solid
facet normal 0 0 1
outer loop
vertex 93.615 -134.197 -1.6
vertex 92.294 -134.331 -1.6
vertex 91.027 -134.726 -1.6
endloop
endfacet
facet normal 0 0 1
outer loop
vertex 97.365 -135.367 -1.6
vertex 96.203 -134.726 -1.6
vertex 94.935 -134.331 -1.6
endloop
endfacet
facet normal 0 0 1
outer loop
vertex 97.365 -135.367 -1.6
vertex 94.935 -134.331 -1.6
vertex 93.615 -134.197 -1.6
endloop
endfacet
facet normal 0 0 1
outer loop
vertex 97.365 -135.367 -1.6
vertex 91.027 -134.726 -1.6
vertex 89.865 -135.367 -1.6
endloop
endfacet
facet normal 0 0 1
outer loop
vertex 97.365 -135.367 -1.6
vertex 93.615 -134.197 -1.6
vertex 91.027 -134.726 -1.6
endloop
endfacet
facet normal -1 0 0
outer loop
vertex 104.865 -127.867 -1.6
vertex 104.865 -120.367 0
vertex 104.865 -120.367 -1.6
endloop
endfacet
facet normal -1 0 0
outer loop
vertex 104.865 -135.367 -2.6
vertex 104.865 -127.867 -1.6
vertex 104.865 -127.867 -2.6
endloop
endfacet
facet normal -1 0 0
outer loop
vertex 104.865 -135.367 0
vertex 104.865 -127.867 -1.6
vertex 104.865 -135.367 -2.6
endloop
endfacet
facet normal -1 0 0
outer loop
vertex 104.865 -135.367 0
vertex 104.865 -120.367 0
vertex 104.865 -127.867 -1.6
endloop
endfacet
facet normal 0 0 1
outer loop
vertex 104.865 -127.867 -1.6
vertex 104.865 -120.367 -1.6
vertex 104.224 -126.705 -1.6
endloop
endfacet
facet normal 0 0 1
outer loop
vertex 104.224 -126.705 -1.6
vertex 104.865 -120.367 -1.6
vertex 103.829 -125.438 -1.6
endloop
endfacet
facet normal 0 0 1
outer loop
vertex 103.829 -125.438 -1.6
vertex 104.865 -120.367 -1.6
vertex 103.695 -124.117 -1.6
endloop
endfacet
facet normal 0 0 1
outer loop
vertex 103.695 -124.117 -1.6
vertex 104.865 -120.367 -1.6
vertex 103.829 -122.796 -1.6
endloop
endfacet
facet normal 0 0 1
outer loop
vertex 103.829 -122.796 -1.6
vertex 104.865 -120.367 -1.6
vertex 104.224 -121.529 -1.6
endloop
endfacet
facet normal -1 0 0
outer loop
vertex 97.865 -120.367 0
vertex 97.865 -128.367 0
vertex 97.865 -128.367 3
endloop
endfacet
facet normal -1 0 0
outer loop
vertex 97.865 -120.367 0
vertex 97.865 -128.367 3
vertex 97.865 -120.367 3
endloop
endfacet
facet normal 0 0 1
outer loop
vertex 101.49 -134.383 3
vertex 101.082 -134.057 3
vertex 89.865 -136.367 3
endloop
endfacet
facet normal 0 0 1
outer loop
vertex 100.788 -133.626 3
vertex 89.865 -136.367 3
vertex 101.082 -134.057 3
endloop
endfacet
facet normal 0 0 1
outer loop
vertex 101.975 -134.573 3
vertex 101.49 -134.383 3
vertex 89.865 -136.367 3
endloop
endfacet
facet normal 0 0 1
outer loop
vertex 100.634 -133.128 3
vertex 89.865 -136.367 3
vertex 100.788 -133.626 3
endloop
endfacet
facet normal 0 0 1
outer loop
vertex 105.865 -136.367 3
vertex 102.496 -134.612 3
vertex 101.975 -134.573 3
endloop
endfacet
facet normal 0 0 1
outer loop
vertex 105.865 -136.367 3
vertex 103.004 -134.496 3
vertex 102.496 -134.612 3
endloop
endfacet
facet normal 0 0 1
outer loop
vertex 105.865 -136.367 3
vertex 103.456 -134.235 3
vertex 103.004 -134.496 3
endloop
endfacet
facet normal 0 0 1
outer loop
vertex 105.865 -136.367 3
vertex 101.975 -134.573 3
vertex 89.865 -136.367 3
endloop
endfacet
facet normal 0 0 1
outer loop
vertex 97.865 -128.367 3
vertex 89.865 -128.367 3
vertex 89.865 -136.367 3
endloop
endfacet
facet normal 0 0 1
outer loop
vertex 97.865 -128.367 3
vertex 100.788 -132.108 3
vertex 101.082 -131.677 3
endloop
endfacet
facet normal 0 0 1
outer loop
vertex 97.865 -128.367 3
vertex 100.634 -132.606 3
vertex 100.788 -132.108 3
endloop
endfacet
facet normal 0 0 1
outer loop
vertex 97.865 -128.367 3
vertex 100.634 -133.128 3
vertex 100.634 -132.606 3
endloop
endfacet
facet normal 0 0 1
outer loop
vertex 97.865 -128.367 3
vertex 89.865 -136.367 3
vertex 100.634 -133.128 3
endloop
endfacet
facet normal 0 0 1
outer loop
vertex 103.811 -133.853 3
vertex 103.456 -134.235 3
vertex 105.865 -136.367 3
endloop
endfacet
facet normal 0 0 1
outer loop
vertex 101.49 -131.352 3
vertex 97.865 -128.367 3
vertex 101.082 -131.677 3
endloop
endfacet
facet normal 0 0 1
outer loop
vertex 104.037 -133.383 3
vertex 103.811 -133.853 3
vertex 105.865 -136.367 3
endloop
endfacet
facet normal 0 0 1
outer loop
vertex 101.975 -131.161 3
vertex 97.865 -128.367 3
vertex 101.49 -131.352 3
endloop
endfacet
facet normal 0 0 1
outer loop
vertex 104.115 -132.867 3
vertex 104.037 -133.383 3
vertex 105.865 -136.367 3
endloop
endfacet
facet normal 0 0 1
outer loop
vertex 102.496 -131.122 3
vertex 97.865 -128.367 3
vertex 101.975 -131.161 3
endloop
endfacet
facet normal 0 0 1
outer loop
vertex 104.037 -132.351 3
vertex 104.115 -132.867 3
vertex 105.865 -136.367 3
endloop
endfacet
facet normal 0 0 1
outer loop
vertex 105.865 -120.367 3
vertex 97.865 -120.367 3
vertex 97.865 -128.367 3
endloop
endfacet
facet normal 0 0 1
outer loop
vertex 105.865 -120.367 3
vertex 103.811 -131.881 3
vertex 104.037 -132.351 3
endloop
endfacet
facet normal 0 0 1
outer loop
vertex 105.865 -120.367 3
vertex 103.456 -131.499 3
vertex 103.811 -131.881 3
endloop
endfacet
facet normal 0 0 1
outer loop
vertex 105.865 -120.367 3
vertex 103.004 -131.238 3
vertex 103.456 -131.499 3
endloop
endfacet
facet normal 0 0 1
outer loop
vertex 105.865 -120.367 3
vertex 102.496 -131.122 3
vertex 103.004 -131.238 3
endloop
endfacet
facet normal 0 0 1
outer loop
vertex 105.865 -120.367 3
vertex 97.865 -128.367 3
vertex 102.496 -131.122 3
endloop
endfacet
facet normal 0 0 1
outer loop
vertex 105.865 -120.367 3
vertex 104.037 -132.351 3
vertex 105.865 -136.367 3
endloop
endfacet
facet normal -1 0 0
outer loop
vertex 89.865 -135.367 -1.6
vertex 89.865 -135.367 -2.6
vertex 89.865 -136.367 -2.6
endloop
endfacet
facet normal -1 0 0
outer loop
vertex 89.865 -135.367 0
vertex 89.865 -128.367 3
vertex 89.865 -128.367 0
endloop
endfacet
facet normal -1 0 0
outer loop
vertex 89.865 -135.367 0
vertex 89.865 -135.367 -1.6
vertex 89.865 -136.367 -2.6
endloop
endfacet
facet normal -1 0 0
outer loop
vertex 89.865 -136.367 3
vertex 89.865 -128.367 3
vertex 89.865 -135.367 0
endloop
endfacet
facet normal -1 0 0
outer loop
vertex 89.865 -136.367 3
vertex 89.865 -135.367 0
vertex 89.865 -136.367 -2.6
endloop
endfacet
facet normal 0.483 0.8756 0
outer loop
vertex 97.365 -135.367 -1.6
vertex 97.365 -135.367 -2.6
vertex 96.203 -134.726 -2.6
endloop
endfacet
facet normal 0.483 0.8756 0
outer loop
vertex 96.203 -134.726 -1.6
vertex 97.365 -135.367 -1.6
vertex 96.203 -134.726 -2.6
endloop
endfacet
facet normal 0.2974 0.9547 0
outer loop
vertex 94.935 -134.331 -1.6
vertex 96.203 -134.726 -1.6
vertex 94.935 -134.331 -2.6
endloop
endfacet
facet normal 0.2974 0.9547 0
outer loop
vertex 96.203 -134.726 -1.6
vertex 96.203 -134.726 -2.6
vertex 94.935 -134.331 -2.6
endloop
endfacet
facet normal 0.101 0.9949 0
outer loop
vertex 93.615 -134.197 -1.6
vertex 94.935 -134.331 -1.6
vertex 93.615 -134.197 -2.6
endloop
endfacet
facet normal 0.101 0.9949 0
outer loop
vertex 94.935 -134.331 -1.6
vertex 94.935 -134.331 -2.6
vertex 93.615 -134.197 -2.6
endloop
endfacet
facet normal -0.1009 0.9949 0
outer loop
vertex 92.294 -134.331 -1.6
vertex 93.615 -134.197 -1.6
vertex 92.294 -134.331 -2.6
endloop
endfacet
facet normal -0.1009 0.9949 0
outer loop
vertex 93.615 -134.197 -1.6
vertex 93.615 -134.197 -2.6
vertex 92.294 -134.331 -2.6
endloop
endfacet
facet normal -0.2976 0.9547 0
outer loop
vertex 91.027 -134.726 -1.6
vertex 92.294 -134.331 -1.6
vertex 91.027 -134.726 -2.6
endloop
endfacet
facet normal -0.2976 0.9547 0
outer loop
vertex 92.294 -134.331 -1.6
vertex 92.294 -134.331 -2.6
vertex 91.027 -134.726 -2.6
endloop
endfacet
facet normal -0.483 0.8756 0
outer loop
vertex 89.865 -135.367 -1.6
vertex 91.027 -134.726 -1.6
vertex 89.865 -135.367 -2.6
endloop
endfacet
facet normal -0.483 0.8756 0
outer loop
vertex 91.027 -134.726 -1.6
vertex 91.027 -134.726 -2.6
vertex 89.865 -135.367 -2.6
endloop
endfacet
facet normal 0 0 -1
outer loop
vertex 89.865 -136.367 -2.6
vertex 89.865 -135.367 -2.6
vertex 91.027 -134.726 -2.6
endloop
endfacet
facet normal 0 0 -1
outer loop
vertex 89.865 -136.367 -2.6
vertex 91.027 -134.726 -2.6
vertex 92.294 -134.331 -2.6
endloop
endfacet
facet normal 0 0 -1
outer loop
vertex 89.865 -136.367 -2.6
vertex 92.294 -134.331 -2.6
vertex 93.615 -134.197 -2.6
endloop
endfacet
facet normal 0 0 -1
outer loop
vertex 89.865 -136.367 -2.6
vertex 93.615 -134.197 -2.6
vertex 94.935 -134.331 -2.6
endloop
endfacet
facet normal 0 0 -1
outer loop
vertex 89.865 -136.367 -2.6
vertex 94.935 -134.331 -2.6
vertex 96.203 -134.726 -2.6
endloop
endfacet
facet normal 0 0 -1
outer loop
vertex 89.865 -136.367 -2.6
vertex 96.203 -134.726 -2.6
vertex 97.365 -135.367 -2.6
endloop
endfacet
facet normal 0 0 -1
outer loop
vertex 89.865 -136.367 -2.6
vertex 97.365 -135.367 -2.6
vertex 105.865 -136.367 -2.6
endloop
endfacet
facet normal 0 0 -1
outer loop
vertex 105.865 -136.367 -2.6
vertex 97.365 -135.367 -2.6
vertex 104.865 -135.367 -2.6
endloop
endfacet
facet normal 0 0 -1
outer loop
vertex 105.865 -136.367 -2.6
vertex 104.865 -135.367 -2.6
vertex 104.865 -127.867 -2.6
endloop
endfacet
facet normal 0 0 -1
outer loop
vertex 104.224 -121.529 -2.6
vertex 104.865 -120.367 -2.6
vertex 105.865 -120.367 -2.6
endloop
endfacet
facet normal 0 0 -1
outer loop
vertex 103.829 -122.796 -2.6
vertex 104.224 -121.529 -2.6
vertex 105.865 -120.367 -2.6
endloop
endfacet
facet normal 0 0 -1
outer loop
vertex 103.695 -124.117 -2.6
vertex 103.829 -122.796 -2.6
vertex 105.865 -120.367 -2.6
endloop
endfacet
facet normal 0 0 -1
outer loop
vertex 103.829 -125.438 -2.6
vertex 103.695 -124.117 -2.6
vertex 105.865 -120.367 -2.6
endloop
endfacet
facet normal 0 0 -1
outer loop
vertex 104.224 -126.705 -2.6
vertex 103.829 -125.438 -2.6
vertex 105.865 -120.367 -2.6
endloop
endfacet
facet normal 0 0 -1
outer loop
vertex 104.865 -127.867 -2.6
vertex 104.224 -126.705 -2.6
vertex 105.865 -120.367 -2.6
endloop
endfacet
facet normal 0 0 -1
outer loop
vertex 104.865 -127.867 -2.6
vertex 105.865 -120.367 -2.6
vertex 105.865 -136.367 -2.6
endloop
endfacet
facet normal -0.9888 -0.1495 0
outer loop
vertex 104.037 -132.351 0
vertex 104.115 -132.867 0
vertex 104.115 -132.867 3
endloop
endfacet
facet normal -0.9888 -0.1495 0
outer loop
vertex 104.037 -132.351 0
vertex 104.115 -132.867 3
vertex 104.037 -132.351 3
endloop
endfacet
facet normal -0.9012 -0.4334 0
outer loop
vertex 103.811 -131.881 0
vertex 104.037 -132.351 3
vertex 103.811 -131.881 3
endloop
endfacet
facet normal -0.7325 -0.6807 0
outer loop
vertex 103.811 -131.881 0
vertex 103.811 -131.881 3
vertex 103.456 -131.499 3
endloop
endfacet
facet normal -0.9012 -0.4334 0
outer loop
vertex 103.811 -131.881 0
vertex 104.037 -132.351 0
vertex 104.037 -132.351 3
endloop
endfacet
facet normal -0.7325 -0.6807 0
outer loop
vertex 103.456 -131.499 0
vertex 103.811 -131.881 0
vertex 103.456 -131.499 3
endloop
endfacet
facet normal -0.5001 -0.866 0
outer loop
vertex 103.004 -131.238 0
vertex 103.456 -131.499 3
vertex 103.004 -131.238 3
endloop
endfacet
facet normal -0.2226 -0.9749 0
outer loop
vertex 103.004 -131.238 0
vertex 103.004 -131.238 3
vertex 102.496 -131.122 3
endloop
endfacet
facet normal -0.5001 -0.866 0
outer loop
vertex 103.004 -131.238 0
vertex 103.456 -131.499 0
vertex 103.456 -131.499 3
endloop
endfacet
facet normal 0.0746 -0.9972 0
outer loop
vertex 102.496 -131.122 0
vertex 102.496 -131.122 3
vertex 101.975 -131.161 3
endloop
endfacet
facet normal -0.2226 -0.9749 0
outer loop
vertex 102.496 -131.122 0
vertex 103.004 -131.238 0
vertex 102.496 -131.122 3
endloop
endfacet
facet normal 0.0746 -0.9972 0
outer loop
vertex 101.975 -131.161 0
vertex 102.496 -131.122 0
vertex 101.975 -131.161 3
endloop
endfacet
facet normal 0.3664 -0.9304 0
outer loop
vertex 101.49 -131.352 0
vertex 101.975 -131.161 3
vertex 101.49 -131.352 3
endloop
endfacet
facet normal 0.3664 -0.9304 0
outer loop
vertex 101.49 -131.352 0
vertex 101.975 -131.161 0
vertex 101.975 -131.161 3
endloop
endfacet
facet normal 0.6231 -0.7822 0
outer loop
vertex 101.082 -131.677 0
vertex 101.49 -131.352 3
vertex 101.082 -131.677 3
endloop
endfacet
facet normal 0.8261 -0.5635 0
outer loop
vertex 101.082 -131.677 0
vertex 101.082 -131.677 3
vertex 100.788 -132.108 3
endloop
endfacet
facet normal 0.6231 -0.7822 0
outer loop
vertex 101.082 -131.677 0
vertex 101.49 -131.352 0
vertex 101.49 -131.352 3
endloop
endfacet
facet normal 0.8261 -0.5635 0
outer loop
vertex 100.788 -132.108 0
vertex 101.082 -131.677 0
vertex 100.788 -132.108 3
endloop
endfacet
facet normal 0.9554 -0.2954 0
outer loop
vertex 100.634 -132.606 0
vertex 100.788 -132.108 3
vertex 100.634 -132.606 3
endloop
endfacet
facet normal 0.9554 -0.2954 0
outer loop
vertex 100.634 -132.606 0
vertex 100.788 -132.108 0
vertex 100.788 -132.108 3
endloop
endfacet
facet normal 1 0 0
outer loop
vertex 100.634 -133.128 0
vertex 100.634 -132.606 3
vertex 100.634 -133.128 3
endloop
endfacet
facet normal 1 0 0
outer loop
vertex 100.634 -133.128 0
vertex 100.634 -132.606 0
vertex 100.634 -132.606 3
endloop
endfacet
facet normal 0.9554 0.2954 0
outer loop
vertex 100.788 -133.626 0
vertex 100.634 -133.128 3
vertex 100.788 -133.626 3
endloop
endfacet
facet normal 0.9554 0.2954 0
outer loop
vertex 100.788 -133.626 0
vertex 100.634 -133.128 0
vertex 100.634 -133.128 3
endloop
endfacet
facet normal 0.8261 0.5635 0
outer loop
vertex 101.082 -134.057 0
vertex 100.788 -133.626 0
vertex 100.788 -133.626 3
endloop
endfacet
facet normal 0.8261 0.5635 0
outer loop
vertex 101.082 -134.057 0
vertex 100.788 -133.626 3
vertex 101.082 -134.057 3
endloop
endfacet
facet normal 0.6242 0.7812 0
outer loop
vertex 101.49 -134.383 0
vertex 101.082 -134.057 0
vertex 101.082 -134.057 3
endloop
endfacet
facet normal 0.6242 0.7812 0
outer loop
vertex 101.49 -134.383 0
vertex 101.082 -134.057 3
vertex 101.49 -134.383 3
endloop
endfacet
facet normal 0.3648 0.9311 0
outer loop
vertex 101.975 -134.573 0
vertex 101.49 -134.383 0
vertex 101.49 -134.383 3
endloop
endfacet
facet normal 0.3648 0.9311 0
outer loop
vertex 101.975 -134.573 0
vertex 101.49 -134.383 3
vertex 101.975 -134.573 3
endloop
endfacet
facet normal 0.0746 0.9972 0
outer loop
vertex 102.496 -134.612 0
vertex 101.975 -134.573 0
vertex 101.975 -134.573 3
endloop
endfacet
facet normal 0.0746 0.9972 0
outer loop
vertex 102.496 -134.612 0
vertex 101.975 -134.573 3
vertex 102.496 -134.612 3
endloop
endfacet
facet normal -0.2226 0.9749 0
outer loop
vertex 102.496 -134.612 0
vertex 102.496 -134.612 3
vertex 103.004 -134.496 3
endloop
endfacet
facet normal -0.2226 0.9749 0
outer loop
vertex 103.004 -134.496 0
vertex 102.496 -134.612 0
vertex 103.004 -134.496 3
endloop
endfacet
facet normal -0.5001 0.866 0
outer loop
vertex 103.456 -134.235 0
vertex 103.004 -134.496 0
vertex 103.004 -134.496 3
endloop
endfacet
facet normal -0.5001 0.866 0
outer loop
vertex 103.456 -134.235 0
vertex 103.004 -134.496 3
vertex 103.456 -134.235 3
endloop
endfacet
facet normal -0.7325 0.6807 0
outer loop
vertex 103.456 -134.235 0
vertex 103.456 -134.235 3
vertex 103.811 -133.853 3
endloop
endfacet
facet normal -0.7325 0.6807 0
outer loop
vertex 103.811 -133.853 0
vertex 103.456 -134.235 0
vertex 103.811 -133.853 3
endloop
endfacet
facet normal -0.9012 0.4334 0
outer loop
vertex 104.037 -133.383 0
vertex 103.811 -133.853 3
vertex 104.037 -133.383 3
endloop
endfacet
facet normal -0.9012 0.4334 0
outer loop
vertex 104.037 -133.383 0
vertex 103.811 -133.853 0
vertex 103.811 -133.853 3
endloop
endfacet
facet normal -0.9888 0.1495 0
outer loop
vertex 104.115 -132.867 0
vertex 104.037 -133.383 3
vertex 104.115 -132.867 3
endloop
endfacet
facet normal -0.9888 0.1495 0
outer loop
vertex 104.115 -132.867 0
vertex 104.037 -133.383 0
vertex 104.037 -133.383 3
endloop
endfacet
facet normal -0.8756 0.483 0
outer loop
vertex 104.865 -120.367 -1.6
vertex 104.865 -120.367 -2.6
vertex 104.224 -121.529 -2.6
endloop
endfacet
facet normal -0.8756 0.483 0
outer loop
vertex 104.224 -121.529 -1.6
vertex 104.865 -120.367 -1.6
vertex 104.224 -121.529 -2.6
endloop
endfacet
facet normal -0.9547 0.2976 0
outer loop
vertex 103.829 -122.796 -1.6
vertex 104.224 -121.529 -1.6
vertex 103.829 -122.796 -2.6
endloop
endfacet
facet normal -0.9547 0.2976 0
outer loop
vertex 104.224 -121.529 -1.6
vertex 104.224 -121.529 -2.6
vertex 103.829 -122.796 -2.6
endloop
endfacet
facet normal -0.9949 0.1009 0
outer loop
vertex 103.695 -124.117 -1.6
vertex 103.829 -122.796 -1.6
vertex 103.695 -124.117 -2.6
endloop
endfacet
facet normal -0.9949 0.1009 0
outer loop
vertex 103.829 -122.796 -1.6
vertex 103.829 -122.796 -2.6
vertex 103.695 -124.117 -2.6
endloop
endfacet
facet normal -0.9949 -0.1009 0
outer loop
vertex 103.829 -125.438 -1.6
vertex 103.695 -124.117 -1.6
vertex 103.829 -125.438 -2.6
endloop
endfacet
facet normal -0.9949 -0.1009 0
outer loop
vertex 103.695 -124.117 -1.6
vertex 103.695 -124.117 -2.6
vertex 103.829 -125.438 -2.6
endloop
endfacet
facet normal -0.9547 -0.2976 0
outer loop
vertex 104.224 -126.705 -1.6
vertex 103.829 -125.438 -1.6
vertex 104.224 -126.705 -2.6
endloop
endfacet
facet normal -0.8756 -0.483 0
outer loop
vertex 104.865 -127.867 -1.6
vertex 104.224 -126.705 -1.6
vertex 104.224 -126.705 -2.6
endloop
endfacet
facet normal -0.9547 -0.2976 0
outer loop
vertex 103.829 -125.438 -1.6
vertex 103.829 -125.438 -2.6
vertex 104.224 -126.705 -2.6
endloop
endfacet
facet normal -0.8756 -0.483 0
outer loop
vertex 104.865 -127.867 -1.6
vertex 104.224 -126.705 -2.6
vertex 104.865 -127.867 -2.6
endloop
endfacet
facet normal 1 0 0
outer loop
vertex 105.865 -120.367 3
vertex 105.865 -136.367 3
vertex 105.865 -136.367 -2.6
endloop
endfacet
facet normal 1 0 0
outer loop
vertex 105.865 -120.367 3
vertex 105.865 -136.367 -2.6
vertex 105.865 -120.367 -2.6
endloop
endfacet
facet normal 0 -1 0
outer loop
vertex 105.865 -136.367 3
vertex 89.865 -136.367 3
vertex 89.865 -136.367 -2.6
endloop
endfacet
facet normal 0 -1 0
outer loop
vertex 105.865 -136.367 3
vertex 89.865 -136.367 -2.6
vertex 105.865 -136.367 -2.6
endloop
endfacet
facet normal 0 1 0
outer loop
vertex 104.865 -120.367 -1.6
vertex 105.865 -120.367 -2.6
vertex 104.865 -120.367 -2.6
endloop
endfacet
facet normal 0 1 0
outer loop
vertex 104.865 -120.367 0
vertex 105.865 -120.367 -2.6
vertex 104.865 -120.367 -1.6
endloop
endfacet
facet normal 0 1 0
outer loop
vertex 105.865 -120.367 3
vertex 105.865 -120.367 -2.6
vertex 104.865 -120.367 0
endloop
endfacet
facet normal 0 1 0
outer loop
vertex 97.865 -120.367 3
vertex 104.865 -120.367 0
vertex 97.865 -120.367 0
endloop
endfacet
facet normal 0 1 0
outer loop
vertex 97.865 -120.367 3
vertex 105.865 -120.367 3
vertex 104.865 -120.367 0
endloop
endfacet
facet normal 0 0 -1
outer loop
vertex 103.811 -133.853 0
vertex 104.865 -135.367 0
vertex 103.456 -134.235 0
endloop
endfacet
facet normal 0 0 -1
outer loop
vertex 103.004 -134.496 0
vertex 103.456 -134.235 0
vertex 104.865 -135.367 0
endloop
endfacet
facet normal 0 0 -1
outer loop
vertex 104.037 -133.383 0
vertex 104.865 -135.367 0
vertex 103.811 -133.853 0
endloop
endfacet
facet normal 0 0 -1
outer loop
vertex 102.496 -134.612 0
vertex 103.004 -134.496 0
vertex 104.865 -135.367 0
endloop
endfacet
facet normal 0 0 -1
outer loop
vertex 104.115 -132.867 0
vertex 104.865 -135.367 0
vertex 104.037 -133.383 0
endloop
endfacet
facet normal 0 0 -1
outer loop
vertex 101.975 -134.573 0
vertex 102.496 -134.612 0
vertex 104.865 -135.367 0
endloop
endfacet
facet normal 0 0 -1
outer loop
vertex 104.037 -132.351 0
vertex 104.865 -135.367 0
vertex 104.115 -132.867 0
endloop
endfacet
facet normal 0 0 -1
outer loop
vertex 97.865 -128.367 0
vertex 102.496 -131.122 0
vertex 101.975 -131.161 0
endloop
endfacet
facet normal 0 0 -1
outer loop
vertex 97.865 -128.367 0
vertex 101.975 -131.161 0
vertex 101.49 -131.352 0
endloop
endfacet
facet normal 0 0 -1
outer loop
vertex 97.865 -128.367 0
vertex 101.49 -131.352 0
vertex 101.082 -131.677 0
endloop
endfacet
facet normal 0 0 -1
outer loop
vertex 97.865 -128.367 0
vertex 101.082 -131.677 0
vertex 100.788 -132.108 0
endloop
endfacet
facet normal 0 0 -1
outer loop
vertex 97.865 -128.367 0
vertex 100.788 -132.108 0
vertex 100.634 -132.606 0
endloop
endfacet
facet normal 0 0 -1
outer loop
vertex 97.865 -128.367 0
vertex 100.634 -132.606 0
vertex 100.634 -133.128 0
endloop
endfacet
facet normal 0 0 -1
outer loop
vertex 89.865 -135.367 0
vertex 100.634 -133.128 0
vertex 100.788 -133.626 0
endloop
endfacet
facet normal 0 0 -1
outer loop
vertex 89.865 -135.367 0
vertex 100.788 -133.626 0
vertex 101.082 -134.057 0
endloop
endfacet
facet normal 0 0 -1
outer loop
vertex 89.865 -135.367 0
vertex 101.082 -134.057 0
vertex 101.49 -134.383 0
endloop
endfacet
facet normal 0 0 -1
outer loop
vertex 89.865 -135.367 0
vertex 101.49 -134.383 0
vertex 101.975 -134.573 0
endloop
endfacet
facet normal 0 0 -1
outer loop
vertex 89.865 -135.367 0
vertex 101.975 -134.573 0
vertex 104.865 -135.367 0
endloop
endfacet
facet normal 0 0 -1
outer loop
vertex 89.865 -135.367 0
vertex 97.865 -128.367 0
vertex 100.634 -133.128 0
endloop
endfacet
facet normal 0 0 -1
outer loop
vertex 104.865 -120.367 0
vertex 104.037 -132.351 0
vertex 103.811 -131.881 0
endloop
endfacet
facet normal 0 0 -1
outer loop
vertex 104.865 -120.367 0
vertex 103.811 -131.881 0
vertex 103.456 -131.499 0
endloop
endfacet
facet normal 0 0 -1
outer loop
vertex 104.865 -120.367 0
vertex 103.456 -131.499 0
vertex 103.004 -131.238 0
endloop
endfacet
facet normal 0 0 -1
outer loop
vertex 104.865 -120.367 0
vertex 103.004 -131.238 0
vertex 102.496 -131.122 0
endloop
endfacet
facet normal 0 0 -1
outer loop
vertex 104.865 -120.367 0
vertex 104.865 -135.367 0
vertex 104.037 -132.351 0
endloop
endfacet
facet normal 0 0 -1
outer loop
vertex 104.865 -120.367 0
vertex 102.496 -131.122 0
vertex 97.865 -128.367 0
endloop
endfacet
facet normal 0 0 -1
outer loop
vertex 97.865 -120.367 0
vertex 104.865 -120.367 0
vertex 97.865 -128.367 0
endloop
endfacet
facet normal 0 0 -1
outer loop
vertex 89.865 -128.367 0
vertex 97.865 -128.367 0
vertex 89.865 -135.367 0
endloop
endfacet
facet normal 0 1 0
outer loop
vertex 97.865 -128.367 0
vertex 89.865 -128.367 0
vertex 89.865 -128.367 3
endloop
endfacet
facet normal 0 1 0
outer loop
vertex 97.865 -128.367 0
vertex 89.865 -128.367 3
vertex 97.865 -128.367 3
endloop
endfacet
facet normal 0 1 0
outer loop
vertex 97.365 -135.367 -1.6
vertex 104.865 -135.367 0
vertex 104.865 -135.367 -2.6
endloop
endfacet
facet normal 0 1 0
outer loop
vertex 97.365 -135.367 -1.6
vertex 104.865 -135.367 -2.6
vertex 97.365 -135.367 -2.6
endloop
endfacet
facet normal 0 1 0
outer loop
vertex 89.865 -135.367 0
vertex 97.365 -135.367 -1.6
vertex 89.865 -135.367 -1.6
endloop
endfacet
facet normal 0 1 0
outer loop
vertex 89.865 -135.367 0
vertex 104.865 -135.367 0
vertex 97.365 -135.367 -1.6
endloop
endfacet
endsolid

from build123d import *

# Parameters (mm, degrees)
ESQUISSE1_R        = 1.75
BOSS_EXTRU_1_DEPTH = 3
BOSS_EXTRU_2_DEPTH = 5.6
BOSS_EXTRU_3_DEPTH = 1


with BuildPart() as part:
    # Esquisse1 → Boss.-Extru.1 (new body)
    with BuildSketch(Plane.XY):
        Polygon((104.864902494, -135.367060458), (89.864902494, -135.367060458), (89.864902494, -128.367060458), (97.864902494, -128.367060458), (97.864902494, -120.367060458), (104.864902494, -120.367060458), align=None)
        with Locations((102.364902494, -132.867060458)):
            Circle(ESQUISSE1_R, mode=Mode.SUBTRACT)
    extrude(amount=BOSS_EXTRU_1_DEPTH)

    # Esquisse2 → Boss.-Extru.2 (add)
    with BuildSketch(Plane.XY.offset(3)):
        Polygon((89.864902494, -135.367060458), (89.864902494, -136.367060458), (105.864902494, -136.367060458), (105.864902494, -120.367060458), (104.864902494, -120.367060458), (104.864902494, -135.367060458), align=None)
    extrude(amount=-BOSS_EXTRU_2_DEPTH)

    # Esquisse3 → Boss.-Extru.3 (add)
    with BuildSketch(Plane(origin=(0, 0, -2.6), x_dir=(-1, 0, 0), z_dir=(0, 0, -1))):
        with BuildLine():
            Line((-89.864902494, -135.367060458), (-97.364902494, -135.367060458))
            ThreePointArc((-97.364902494, -135.367060458), (-93.614902494, -134.19740032), (-89.864902494, -135.367060458))
        make_face()
        with BuildLine():
            Line((-104.864902494, -127.867060458), (-104.864902494, -120.367060458))
            ThreePointArc((-104.864902494, -120.367060458), (-103.695242356, -124.117060458), (-104.864902494, -127.867060458))
        make_face()
    extrude(amount=-BOSS_EXTRU_3_DEPTH)


solid = part.part
